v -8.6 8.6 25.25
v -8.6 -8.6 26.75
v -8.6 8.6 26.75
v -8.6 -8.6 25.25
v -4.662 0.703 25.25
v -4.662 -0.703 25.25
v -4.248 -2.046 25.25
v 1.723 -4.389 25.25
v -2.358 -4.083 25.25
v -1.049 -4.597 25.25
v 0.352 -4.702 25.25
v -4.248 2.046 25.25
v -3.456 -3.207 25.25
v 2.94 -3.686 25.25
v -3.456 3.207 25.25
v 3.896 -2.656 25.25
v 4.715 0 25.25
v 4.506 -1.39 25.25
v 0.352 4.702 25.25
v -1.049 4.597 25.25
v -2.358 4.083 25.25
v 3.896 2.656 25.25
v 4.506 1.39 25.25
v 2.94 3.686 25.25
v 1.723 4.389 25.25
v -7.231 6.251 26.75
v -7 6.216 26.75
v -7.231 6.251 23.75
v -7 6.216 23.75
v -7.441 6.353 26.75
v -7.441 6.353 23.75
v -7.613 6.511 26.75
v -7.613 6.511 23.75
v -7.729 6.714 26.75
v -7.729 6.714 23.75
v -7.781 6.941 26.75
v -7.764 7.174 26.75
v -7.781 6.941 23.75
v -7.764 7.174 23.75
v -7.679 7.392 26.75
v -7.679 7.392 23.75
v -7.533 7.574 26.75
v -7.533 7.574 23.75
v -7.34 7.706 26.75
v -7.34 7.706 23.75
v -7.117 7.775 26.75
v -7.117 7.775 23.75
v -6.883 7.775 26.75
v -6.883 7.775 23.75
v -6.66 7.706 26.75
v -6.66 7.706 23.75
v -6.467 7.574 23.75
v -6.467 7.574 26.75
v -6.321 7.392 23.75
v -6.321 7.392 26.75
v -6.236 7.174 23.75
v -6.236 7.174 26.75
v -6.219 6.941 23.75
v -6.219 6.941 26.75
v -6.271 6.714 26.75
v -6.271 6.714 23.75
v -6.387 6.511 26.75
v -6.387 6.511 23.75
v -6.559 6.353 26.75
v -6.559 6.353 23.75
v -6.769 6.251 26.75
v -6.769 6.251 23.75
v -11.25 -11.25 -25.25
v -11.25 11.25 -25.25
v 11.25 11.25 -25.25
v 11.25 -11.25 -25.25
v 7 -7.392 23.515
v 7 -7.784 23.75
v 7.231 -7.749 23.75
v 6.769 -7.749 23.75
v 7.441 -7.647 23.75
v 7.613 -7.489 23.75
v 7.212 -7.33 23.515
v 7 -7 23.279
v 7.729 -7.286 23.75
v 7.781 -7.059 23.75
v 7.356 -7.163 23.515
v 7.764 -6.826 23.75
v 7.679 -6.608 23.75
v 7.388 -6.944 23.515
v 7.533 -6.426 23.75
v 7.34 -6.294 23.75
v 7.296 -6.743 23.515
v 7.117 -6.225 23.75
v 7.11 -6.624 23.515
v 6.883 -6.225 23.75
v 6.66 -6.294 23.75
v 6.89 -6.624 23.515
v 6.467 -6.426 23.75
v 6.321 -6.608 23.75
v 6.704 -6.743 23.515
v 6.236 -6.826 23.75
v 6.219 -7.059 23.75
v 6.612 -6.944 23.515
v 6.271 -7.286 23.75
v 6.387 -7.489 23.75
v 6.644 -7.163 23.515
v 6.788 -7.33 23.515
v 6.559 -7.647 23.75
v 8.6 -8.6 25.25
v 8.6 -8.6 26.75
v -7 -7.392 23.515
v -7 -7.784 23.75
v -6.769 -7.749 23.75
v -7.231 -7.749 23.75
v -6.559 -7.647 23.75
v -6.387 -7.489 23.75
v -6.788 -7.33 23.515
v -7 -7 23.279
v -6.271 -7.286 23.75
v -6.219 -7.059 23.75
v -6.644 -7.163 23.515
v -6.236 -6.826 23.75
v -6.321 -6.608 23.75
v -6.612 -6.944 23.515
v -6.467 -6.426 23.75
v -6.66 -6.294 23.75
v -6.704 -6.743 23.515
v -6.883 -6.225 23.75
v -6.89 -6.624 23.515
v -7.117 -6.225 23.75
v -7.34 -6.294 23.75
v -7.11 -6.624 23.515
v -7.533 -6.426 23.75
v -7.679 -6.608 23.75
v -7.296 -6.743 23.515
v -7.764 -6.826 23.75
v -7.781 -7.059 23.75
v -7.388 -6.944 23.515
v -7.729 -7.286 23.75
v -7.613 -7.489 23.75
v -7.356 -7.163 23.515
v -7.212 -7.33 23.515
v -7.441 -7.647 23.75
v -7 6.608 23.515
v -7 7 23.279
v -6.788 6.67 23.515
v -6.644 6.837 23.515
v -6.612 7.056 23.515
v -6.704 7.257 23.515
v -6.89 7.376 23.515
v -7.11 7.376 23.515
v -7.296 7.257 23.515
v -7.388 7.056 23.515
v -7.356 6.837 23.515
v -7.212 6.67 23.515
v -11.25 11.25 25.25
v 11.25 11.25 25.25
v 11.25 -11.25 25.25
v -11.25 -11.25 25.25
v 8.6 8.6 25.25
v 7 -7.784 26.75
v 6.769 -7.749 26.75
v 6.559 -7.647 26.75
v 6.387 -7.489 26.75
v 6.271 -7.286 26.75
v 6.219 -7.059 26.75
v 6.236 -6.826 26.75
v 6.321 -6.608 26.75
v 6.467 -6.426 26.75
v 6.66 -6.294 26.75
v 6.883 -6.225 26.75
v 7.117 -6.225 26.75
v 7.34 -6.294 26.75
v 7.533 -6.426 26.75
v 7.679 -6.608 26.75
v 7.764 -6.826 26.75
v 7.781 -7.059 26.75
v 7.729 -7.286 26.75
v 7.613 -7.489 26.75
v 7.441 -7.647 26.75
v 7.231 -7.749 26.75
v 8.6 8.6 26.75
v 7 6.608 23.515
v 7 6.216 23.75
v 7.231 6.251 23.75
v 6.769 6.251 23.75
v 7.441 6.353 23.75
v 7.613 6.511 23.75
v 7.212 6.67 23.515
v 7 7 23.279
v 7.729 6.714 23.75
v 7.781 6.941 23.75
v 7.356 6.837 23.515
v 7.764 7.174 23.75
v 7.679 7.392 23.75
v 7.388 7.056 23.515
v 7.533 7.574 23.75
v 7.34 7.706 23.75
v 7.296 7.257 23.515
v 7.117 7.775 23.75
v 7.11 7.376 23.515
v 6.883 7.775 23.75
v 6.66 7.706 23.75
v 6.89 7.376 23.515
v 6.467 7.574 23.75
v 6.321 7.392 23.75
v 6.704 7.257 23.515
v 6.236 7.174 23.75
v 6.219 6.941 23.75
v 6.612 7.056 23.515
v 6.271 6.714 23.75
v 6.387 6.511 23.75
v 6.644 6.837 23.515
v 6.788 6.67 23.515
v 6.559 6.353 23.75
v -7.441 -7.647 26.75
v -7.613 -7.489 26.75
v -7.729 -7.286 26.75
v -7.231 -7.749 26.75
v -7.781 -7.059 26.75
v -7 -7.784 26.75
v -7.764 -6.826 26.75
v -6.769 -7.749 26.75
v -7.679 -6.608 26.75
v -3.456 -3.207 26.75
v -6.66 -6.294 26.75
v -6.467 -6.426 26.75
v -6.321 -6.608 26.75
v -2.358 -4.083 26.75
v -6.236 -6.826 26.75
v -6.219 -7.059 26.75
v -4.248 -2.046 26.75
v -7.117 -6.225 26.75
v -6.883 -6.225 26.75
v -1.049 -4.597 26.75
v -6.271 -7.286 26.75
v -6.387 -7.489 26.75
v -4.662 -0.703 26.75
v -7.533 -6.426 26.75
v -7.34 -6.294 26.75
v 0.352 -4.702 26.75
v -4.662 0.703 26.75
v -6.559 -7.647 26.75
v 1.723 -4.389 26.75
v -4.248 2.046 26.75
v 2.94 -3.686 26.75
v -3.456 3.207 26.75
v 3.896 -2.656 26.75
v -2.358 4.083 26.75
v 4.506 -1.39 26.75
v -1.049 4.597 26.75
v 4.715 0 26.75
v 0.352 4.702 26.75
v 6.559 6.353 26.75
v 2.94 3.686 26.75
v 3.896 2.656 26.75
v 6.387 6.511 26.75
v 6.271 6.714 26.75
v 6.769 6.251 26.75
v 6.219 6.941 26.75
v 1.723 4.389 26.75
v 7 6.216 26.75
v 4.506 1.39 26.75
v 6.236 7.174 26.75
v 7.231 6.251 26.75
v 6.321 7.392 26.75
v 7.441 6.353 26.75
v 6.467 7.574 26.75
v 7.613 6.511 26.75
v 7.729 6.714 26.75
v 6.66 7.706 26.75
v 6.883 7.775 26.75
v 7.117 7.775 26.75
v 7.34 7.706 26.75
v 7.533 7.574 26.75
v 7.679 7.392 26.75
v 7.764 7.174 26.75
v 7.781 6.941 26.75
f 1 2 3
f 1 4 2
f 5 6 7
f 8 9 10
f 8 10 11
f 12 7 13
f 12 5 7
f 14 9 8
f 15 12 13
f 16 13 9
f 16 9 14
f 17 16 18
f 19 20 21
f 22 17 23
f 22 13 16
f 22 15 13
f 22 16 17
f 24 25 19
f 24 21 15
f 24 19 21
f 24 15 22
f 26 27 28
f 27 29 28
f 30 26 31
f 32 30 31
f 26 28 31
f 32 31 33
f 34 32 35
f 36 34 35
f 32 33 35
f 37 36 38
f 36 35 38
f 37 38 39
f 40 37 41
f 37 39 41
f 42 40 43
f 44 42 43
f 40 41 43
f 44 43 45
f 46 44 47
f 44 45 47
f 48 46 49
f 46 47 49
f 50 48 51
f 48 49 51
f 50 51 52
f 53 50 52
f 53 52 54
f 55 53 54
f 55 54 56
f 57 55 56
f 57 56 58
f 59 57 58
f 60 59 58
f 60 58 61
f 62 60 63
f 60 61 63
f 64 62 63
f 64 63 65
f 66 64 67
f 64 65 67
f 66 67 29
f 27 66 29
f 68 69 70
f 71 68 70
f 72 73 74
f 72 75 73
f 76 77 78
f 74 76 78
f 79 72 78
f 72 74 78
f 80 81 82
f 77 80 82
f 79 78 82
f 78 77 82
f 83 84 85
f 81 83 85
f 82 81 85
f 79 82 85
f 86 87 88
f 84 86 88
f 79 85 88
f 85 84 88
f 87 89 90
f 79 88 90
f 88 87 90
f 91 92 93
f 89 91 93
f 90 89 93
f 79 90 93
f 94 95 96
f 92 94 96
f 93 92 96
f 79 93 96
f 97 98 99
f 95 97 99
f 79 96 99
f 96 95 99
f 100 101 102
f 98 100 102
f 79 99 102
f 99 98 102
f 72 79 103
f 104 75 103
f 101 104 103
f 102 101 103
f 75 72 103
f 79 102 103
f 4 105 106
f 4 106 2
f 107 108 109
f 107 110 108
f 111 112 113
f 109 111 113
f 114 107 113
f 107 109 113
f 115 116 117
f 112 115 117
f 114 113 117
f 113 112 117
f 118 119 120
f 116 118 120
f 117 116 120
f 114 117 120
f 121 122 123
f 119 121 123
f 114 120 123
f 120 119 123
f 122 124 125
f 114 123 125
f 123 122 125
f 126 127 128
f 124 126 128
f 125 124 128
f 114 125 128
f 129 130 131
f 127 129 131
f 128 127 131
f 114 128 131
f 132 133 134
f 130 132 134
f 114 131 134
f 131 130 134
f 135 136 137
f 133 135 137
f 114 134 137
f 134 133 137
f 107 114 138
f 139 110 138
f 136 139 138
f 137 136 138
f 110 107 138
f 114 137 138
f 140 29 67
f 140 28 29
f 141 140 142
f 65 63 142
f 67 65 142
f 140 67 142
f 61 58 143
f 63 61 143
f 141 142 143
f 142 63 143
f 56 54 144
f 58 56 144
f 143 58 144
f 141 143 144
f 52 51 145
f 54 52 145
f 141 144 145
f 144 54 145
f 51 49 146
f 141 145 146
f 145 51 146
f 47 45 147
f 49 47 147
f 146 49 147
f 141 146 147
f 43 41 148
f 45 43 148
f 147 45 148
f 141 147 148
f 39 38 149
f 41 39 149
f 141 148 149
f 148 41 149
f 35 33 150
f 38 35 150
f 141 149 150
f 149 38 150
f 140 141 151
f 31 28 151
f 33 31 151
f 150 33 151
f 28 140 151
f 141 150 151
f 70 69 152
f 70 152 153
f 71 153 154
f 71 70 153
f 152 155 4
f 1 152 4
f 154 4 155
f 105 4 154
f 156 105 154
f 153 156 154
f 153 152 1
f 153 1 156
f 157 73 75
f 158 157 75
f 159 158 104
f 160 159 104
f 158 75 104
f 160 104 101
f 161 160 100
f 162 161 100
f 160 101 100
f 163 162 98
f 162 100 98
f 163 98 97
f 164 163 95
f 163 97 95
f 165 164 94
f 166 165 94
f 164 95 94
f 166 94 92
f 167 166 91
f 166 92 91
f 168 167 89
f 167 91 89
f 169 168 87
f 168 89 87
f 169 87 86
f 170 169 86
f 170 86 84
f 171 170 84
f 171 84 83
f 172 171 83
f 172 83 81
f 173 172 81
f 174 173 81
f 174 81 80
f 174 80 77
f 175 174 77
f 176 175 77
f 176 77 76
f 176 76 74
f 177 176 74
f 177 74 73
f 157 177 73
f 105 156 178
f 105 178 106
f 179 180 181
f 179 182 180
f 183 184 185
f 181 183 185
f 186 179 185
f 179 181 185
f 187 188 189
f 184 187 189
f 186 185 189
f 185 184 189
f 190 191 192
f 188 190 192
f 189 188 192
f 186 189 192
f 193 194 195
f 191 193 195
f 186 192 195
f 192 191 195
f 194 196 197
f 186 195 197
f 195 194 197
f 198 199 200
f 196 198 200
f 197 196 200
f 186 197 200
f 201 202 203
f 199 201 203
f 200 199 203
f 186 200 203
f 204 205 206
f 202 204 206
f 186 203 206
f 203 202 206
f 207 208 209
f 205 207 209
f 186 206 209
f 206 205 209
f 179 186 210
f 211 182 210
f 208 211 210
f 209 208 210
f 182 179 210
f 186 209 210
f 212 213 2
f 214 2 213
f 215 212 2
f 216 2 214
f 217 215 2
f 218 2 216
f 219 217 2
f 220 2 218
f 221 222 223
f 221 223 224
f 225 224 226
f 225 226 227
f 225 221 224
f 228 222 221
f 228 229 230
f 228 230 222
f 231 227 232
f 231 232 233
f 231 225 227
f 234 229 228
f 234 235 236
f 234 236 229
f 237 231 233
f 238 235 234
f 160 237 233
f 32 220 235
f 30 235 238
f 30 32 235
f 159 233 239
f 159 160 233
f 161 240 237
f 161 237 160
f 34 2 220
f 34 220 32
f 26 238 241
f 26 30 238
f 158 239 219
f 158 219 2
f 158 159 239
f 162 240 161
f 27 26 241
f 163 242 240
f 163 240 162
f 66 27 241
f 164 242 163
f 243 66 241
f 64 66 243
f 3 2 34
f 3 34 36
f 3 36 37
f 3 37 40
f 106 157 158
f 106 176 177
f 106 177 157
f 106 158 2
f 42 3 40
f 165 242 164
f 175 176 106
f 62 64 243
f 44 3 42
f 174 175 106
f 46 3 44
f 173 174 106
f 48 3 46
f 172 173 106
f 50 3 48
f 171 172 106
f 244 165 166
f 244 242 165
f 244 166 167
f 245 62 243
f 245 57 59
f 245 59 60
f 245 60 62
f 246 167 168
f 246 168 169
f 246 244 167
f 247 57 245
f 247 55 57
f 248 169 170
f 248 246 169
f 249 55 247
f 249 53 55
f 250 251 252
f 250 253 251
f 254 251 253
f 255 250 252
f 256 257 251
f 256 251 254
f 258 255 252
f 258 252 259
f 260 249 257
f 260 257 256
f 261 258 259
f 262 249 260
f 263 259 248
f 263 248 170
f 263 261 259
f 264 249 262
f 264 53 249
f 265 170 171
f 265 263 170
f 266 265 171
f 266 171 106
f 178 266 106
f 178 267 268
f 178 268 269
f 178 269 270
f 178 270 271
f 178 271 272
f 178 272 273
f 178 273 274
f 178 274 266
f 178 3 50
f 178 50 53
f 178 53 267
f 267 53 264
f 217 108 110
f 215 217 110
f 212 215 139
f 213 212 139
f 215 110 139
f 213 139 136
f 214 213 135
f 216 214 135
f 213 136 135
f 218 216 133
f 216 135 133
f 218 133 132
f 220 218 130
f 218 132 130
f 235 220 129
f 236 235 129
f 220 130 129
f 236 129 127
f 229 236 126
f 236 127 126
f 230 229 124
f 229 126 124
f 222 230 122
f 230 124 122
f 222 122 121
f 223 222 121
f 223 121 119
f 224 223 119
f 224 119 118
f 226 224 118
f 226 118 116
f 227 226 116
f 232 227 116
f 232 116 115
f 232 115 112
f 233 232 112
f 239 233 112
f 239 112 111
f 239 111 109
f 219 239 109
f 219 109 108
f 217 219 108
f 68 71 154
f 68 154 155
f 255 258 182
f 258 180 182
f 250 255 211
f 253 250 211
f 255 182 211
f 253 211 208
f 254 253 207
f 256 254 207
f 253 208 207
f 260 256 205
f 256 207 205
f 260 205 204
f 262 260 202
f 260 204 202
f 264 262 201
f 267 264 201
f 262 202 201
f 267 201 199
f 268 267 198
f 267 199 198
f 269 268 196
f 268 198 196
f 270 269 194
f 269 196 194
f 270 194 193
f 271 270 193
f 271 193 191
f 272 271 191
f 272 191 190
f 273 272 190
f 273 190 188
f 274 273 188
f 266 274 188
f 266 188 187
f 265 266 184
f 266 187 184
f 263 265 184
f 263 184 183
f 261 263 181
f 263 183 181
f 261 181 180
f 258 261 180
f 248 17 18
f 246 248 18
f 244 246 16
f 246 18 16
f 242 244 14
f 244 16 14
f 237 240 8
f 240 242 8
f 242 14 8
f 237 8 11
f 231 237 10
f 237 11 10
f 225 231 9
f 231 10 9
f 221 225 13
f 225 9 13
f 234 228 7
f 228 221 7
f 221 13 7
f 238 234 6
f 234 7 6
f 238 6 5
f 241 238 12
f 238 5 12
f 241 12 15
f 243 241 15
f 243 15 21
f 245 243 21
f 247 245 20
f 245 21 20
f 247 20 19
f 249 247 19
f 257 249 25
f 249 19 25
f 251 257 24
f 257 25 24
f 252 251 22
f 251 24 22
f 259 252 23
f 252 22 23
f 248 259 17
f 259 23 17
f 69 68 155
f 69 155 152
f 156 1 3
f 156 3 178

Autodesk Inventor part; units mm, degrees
ref_plane "YZ Plane" through (0, 0, 0) normal (1, 0, 0) x (0, 1, 0)
ref_plane "XZ Plane" through (0, 0, 0) normal (0, 1, 0) x (-1, 0, 0)
ref_plane "XY Plane" through (0, 0, 0) normal (0, 0, 1) x (1, 0, 0)
sketch "Sketch1" plane through (0, 0, 0) normal (0, 0, 1) x (1, 0, 0)
  line L0 (-11.25, 11.25) -> (11.25, 11.25)
  line L1 (11.25, 11.25) -> (11.25, -11.25)
  line L2 (11.25, -11.25) -> (-11.25, -11.25)
  line L3 (-11.25, -11.25) -> (-11.25, 11.25)
  line L4 (-11.25, 11.25) -> (11.25, -11.25) construction
  line L5 (11.25, 11.25) -> (-11.25, -11.25) construction
  point P0 (0, 0)
  dimension "d0" = 22.5
  dimension "d1" = 22.5
extrude "Extrusion1" add sketch "Sketch1" along normal mid plane 50.5
sketch "Sketch8" plane through (0, 0, 25.25) normal (0, 0, 1) x (1, 0, 0)
  line L0 (-8.6, 8.6) -> (8.6, 8.6)
  line L1 (8.6, 8.6) -> (8.6, -8.6)
  line L2 (8.6, -8.6) -> (-8.6, -8.6)
  line L3 (-8.6, -8.6) -> (-8.6, 8.6)
  line L4 (-8.6, 8.6) -> (8.6, -8.6) construction
  line L5 (8.6, 8.6) -> (-8.6, -8.6) construction
  circle A0 centre (0, 0) radius 4.715
  dimension "d41" = 17.2
  dimension "d42" = 17.2
  dimension "d43" = 9.43
extrude "Extrusion4" add sketch "Sketch8" along normal blind 1.5
sketch "Sketch9" plane through (0, 0, 26.75) normal (0, 0, 1) x (1, 0, 0)
  line L0 (-8.6, -8.6) -> (8.6, -8.6) projected
  line L1 (8.6, -8.6) -> (8.6, 8.6) projected
  line L2 (8.6, 8.6) -> (-8.6, 8.6) projected
  line L3 (-8.6, 8.6) -> (-8.6, -8.6) projected
  circle A0 centre (0, 0) radius 4.715 projected
  line L4 (-8.6, -8.6) -> (8.6, -8.6) projected
  line L5 (8.6, -8.6) -> (8.6, 8.6) projected
  line L6 (8.6, 8.6) -> (-8.6, 8.6) projected
  line L7 (-8.6, 8.6) -> (-8.6, -8.6) projected
  circle A1 centre (0, 0) radius 4.715 projected
  point P0 (-7, 7)
  point P1 (7, 7)
  point P2 (-7, -7)
  point P3 (7, -7)
  dimension "d48" = 14
  dimension "d51" = 14
  dimension "d54" = 7
  dimension "d55" = 7
hole "Hole3" at (-7, 7, 26.75) at (7, 7, 26.75) at (-7, -7, 26.75) at (7, -7, 26.75) direction (0, 0, -1) diameter 1.567 depth 3 tip angle 118 thread size "M2x0.4" class "6H" standard "ANSI Metric M Profile"
equation "\"d42\" = d41"
properties part number "toppmt"
